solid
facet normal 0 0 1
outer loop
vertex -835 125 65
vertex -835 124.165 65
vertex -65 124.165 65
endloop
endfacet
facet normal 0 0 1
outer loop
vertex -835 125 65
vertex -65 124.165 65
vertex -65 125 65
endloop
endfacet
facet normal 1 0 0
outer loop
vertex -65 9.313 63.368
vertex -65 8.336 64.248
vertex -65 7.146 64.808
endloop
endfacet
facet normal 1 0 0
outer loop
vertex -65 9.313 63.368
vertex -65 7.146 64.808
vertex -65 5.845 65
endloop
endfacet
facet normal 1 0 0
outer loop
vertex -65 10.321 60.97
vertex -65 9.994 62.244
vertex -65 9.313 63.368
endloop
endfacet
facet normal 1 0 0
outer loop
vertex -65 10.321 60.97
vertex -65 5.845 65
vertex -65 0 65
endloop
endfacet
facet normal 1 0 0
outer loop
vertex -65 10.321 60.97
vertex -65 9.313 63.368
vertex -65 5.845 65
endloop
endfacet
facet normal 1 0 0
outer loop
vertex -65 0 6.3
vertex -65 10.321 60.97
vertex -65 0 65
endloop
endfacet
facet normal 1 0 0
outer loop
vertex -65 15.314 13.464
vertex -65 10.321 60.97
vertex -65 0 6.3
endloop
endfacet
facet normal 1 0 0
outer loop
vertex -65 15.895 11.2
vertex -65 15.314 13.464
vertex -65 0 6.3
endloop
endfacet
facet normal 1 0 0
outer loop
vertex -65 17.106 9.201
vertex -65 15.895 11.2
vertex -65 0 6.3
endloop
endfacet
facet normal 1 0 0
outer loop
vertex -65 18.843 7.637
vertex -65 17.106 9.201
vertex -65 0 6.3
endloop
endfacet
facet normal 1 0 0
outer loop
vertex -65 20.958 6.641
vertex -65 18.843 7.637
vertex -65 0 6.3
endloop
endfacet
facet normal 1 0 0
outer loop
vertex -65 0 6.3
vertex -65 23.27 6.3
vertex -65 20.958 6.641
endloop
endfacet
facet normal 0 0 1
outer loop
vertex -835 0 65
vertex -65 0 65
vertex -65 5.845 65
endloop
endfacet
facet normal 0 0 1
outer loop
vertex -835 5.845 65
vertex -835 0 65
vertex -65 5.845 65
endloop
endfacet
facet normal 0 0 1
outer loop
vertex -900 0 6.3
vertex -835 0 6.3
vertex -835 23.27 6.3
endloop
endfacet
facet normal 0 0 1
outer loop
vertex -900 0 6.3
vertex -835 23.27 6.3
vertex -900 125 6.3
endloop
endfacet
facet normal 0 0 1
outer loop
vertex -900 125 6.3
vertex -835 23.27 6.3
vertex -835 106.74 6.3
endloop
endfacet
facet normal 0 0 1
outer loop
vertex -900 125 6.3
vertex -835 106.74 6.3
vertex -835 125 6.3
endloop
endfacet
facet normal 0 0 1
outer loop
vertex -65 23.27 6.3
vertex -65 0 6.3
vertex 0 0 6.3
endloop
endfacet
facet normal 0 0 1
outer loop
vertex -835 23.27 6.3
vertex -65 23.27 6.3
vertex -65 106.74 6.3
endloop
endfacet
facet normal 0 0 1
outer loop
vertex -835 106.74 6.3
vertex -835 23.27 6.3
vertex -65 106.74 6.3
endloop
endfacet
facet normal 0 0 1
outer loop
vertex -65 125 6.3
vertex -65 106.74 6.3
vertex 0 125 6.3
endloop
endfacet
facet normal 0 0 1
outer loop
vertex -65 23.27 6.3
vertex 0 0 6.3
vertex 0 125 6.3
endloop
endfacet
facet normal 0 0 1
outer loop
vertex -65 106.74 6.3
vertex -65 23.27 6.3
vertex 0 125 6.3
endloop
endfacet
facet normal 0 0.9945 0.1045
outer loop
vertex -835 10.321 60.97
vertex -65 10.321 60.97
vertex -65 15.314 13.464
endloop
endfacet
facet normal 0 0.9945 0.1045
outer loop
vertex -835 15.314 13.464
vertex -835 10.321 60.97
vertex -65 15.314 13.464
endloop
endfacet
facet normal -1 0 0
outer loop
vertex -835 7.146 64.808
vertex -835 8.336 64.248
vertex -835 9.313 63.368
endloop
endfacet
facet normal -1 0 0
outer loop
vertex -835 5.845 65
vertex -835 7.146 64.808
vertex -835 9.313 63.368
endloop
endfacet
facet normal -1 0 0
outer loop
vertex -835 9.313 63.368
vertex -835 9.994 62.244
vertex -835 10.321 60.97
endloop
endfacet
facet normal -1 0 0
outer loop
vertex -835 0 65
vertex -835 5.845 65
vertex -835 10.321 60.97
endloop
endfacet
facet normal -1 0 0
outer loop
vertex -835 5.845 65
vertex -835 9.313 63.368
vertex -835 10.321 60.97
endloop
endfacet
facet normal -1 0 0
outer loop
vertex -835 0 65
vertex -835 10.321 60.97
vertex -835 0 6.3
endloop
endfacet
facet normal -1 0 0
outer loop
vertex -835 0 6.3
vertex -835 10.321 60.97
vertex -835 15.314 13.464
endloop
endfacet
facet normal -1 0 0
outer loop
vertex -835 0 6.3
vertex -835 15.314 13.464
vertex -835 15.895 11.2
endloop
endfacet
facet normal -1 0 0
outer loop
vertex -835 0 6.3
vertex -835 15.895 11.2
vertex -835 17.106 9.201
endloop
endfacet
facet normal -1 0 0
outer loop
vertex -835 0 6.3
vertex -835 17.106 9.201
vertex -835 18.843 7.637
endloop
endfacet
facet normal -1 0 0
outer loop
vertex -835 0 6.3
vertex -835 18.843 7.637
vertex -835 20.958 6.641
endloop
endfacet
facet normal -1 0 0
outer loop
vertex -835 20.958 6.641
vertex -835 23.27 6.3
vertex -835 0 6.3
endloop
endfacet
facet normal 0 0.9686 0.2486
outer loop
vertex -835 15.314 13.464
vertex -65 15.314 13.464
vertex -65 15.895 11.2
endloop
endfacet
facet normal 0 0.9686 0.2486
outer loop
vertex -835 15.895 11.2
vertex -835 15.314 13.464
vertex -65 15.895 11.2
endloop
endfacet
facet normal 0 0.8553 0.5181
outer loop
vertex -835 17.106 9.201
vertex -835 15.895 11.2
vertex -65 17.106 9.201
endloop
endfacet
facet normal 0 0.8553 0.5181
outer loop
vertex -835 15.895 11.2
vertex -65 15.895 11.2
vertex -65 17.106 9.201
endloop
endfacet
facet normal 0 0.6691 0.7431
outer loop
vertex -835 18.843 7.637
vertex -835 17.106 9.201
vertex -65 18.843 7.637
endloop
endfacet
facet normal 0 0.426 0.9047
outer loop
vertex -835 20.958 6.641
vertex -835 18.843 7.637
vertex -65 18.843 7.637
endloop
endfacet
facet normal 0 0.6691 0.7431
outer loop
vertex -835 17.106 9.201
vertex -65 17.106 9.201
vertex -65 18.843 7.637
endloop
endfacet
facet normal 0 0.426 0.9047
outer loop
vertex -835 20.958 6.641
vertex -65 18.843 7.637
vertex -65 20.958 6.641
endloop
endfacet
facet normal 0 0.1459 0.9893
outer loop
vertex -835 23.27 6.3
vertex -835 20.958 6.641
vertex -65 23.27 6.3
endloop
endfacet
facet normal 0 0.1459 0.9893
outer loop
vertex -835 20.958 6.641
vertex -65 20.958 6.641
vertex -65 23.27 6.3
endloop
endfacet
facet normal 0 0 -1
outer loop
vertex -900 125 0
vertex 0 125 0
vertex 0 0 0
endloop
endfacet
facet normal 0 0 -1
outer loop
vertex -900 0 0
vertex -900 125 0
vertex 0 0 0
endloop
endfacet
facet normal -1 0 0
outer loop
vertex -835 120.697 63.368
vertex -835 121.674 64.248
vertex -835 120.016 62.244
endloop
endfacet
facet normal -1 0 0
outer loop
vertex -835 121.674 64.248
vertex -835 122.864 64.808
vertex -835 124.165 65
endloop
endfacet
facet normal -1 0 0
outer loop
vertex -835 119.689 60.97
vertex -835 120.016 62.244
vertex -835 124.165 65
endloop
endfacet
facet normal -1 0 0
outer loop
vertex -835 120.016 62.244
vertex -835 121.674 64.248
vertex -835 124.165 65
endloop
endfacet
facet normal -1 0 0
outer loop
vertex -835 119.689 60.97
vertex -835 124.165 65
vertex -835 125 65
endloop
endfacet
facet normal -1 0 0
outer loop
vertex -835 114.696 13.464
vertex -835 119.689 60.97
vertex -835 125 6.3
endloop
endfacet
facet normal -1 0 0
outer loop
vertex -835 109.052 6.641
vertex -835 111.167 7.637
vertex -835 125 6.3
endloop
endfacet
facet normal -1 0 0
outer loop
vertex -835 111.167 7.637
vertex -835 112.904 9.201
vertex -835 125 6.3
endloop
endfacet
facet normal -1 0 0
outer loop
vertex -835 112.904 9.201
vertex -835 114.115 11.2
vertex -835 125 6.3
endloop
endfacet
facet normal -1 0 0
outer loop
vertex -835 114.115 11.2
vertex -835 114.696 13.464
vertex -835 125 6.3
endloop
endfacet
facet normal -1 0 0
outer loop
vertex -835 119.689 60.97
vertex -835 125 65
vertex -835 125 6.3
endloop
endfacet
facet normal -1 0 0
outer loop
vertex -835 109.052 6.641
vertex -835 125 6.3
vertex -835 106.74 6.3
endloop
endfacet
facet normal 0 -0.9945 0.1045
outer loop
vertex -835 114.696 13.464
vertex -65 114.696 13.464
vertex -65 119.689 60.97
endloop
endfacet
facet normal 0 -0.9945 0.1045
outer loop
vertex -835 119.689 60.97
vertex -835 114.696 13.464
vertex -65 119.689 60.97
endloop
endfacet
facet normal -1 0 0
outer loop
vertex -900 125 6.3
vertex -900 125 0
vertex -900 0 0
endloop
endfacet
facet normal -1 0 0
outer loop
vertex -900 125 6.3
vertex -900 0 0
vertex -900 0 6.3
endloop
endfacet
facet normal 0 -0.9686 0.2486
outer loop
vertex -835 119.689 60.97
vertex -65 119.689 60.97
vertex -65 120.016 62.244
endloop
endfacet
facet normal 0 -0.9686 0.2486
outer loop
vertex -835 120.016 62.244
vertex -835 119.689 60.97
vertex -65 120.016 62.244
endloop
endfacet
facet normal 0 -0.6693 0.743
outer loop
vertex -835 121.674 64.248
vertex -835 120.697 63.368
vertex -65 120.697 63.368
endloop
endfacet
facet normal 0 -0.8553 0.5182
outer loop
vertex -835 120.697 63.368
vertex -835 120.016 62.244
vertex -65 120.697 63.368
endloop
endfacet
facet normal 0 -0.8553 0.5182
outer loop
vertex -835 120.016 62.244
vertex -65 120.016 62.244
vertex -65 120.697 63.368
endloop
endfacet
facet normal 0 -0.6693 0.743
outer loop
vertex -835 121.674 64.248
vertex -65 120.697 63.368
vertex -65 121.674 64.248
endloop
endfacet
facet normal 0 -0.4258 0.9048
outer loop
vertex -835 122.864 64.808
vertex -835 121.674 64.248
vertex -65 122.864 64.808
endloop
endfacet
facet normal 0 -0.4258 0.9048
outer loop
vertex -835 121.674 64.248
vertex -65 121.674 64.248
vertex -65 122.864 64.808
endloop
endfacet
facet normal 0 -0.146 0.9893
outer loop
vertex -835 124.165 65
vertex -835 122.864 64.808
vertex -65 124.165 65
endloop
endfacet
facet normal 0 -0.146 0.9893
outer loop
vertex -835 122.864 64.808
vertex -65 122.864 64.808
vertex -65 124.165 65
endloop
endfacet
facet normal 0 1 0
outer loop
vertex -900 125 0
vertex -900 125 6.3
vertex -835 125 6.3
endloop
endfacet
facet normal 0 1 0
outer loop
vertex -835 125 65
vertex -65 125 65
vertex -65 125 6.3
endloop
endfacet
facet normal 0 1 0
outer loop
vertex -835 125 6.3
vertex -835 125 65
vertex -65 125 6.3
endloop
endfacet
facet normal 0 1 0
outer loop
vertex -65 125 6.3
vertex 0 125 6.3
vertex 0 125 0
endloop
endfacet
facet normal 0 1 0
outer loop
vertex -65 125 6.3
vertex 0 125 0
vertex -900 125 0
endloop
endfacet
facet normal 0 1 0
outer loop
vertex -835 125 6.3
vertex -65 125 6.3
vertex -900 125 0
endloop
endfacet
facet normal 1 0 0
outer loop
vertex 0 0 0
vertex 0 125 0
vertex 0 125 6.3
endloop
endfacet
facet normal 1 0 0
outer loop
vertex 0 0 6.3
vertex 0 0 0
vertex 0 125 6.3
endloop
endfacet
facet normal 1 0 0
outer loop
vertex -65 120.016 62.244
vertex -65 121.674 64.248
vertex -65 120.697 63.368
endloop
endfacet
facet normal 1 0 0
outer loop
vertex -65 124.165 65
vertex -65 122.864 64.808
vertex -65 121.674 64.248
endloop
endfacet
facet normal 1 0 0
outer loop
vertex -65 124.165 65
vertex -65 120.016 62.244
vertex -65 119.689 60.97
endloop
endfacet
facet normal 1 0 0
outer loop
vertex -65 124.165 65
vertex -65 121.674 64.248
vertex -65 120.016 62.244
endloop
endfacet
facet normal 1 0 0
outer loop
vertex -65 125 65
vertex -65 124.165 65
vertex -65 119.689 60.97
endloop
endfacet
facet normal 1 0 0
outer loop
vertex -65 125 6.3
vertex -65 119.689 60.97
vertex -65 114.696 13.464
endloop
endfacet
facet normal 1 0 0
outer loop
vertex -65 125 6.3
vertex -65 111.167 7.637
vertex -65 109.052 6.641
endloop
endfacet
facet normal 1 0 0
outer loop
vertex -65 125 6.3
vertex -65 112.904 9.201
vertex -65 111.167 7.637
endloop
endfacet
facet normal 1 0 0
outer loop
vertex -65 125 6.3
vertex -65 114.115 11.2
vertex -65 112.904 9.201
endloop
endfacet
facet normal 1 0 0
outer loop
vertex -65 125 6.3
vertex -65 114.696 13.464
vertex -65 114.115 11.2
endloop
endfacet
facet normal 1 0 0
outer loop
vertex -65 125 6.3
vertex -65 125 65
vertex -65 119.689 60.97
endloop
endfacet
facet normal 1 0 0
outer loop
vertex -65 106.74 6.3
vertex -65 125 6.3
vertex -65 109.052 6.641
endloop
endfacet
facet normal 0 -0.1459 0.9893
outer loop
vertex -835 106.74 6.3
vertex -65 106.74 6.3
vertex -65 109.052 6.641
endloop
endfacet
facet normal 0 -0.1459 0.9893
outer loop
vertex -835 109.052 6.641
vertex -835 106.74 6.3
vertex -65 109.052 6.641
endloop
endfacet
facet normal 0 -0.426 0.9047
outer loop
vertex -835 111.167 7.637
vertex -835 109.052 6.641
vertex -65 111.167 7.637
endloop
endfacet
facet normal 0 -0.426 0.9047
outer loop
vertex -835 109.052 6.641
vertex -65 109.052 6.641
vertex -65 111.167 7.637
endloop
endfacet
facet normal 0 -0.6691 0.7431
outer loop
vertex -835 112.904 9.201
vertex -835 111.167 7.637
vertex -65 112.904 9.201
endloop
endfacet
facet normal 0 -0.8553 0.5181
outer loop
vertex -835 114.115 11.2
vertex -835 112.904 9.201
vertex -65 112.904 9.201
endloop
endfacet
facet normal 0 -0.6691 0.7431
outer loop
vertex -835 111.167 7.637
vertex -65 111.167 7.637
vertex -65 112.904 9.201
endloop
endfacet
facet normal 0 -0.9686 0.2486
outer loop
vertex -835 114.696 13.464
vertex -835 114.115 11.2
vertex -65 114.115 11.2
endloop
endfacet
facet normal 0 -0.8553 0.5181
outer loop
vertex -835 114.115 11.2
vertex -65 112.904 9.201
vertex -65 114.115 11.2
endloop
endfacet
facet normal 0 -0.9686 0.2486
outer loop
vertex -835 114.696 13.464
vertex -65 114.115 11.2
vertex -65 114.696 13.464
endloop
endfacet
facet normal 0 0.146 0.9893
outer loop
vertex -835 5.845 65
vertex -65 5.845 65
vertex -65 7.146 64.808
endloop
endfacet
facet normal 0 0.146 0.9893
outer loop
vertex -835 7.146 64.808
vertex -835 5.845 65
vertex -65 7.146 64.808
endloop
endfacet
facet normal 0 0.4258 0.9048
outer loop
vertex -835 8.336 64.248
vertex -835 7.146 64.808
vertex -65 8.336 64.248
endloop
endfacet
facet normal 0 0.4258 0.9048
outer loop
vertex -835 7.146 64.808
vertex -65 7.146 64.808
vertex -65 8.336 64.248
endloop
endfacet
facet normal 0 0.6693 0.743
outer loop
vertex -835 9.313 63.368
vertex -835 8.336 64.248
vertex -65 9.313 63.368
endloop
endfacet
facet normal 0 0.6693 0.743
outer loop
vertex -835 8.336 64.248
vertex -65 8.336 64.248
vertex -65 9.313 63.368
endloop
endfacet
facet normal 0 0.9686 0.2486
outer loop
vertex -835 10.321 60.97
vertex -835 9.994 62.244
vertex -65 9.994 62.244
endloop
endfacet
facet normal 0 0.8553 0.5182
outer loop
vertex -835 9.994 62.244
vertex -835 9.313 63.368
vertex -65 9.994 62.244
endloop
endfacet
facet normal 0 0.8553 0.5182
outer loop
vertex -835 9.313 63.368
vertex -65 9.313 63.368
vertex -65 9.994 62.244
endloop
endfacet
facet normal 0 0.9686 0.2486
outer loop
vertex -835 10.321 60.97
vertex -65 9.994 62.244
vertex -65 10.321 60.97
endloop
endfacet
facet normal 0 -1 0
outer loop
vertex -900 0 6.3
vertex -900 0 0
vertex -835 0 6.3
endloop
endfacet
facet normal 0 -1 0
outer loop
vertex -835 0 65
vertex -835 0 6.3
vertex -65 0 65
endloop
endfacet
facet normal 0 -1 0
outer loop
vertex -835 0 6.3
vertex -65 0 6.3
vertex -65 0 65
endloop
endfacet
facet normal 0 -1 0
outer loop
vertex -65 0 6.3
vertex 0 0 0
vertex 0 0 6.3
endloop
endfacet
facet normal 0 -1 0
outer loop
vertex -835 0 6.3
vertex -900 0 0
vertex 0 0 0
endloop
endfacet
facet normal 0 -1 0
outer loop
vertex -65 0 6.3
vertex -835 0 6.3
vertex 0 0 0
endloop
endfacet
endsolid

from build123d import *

# Parameters (mm, degrees)
C_CHANNEL_120_X_12_1_DEPTH = 900
CUT_EXTRUDE1_DEPTH         = 65


with BuildPart() as part:
    # Sketch12 → C channel 120 X 12(1) (new body)
    with BuildSketch(Plane.ZY):
        with BuildLine():
            Line((65, 125), (0, 125))
            Line((0, 125), (0, 0))
            Line((0, 0), (65, 0))
            Line((65, 0), (65, 5.845330836))
            ThreePointArc((65, 5.845330836), (63.844151715, 8.856418565), (60.970378085, 10.320679365))
            Line((60.970378085, 10.320679365), (13.463772294, 15.313824837))
            ThreePointArc((13.463772294, 15.313824837), (8.354841396, 17.916955149), (6.3, 23.27))
            Line((6.3, 23.27), (6.3, 106.74))
            ThreePointArc((6.3, 106.74), (8.354841396, 112.093044851), (13.463772294, 114.696175163))
            Line((13.463772294, 114.696175163), (60.970378085, 119.689320635))
            ThreePointArc((60.970378085, 119.689320635), (63.844151715, 121.153581435), (65, 124.164669164))
            Line((65, 124.164669164), (65, 125))
        make_face()
    extrude(amount=C_CHANNEL_120_X_12_1_DEPTH)

    # Sketch13 → Cut-Extrude1 (cut)
    with BuildSketch(Plane(origin=(0, 0, 0), x_dir=(0, 0, -1), z_dir=(1, 0, 0))):
        Polygon((-6.3, 106.74), (-6.3, 128.866505143), (-71.707289192, 128.866505143), (-71.707289192, -13.872532072), (-6.3, -13.872532072), align=None)
    cut_extrude1 = extrude(amount=-CUT_EXTRUDE1_DEPTH, mode=Mode.SUBTRACT)

    # Mirror1: Cut-Extrude1 across plane
    add(cut_extrude1.mirror(Plane(origin=(-450, 0, 0), x_dir=(0, 0, 1), z_dir=(1, 0, 0))), mode=Mode.SUBTRACT)


solid = part.part
